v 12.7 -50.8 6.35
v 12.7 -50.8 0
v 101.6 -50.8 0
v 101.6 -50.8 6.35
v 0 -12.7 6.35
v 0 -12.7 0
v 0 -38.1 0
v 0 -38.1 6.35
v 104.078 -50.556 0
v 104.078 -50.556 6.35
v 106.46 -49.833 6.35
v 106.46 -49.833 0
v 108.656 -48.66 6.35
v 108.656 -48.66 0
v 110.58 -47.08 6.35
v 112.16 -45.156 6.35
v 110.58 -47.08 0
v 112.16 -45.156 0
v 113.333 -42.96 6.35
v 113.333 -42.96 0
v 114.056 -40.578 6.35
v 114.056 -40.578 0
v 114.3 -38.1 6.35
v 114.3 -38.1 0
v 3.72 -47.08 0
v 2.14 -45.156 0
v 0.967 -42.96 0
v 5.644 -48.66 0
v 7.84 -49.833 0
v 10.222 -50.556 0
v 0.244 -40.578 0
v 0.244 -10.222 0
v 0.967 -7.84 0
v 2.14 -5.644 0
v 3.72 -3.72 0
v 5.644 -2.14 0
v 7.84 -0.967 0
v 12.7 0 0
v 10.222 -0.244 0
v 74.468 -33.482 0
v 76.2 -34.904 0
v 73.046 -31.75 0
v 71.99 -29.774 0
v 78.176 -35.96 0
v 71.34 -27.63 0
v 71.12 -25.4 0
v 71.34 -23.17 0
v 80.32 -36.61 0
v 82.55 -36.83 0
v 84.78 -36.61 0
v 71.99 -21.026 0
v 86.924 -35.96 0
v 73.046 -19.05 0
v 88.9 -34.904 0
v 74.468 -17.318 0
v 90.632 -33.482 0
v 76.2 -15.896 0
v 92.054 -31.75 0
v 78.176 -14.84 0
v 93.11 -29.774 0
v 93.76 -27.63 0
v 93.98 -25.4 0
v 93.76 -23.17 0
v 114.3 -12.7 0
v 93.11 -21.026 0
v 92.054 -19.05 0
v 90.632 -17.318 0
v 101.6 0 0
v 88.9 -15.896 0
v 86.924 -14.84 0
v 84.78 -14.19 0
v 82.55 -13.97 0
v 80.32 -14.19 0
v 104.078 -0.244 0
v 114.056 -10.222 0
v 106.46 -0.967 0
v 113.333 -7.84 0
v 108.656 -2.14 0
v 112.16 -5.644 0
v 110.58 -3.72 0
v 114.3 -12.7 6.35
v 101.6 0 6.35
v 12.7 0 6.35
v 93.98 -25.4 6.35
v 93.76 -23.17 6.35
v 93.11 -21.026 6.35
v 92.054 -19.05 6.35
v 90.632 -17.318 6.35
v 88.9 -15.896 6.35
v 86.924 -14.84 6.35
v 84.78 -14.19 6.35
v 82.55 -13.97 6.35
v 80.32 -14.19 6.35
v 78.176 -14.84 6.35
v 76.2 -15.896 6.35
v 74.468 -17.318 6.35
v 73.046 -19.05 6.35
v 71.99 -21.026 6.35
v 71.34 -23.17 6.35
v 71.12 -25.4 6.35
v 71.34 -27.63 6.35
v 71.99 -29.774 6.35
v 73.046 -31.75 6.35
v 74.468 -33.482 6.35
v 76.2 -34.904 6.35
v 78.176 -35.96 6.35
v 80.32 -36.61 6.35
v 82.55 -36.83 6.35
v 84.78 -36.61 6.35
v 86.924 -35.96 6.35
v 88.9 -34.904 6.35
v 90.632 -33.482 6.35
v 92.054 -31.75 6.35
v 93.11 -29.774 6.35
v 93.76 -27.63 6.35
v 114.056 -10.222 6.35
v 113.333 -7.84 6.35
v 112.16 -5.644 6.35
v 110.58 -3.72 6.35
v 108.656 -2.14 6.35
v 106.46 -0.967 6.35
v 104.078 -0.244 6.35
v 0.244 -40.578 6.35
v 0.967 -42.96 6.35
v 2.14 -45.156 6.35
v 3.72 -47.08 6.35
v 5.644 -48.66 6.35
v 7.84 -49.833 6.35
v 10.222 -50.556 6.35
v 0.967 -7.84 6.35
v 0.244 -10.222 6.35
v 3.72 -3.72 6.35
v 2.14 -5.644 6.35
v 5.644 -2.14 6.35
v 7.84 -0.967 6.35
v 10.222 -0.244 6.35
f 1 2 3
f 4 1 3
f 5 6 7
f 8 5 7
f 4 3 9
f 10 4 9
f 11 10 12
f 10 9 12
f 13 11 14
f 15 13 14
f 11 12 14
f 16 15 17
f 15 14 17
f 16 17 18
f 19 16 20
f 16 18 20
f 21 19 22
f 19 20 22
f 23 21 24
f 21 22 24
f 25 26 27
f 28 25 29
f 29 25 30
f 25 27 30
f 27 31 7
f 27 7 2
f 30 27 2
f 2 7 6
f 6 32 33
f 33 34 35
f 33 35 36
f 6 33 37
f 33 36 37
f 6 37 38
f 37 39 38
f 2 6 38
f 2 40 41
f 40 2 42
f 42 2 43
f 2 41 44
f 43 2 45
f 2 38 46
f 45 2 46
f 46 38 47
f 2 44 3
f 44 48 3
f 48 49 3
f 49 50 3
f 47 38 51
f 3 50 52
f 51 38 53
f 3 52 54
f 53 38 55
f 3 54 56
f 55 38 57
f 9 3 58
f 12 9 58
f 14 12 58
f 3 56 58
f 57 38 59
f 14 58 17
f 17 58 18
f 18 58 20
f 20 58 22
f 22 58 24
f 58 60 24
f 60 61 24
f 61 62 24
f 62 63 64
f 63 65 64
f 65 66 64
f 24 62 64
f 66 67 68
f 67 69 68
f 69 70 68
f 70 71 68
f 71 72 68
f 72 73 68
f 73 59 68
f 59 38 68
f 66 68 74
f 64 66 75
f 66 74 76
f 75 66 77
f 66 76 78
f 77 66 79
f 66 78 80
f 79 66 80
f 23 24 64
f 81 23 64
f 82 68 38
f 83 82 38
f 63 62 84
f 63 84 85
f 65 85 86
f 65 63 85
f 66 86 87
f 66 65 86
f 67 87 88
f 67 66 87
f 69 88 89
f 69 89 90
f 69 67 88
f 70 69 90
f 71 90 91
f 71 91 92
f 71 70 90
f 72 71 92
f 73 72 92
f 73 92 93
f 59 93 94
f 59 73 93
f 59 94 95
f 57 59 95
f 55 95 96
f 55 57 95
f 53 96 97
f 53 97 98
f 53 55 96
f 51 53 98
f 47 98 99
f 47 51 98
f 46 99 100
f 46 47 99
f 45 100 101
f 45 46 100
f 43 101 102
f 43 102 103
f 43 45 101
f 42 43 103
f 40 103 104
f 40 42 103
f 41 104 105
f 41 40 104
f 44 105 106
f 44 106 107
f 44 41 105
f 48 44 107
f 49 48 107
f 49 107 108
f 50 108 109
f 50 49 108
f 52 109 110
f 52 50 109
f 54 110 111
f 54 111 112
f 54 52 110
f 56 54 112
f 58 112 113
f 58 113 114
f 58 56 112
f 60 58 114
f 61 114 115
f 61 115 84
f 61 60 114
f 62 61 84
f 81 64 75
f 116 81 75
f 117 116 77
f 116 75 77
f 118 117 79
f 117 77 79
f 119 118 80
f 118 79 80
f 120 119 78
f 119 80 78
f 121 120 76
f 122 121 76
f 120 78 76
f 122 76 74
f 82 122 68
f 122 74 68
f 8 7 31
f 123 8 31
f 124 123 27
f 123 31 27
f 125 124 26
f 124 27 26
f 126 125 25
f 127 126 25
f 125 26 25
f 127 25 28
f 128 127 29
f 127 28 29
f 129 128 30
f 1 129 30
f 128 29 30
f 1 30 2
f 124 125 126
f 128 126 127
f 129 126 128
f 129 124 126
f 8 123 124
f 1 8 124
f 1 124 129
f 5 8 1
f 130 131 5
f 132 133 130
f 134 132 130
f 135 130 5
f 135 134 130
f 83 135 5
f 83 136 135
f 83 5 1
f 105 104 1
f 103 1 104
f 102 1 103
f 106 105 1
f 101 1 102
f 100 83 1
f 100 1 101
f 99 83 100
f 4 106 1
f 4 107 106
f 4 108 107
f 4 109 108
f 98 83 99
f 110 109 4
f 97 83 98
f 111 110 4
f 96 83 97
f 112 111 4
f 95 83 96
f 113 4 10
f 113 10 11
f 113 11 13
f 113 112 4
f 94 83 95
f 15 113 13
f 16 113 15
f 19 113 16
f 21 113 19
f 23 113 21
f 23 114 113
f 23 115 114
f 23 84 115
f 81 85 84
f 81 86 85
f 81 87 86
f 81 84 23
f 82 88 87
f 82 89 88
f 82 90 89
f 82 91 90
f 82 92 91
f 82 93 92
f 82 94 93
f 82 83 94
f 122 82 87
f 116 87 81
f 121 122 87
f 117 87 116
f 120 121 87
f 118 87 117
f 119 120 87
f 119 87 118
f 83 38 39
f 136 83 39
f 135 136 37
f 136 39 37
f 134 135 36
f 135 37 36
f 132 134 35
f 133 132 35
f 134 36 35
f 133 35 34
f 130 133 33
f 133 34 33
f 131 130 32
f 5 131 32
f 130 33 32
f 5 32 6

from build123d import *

# Parameters (mm, degrees)
F0_R     = 11.43
F1_DEPTH = 6.35


with BuildPart() as f1:
    # F0 (on Top) → F1 (new body)
    with BuildSketch(Plane.XY):
        with BuildLine():
            Line((50.8, 0), (12.7, 0))
            ThreePointArc((12.7, 0), (3.719744, -3.719744), (0, -12.7))
            Line((0, -12.7), (0, -38.1))
            ThreePointArc((0, -38.1), (3.719744, -47.080256), (12.7, -50.8))
            Line((12.7, -50.8), (50.8, -50.8))
            Line((50.8, -50.8), (50.8, 0))
        make_face()
        with BuildLine():
            Line((101.6, 0), (50.8, 0))
            Line((50.8, 0), (50.8, -50.8))
            Line((50.8, -50.8), (101.6, -50.8))
            ThreePointArc((101.6, -50.8), (110.580256, -47.080256), (114.3, -38.1))
            Line((114.3, -38.1), (114.3, -12.7))
            ThreePointArc((114.3, -12.7), (110.580256, -3.719744), (101.6, 0))
        make_face()
        with Locations((82.55, -25.4)):
            Circle(F0_R, mode=Mode.SUBTRACT)
    extrude(amount=F1_DEPTH)


solid = f1.part
